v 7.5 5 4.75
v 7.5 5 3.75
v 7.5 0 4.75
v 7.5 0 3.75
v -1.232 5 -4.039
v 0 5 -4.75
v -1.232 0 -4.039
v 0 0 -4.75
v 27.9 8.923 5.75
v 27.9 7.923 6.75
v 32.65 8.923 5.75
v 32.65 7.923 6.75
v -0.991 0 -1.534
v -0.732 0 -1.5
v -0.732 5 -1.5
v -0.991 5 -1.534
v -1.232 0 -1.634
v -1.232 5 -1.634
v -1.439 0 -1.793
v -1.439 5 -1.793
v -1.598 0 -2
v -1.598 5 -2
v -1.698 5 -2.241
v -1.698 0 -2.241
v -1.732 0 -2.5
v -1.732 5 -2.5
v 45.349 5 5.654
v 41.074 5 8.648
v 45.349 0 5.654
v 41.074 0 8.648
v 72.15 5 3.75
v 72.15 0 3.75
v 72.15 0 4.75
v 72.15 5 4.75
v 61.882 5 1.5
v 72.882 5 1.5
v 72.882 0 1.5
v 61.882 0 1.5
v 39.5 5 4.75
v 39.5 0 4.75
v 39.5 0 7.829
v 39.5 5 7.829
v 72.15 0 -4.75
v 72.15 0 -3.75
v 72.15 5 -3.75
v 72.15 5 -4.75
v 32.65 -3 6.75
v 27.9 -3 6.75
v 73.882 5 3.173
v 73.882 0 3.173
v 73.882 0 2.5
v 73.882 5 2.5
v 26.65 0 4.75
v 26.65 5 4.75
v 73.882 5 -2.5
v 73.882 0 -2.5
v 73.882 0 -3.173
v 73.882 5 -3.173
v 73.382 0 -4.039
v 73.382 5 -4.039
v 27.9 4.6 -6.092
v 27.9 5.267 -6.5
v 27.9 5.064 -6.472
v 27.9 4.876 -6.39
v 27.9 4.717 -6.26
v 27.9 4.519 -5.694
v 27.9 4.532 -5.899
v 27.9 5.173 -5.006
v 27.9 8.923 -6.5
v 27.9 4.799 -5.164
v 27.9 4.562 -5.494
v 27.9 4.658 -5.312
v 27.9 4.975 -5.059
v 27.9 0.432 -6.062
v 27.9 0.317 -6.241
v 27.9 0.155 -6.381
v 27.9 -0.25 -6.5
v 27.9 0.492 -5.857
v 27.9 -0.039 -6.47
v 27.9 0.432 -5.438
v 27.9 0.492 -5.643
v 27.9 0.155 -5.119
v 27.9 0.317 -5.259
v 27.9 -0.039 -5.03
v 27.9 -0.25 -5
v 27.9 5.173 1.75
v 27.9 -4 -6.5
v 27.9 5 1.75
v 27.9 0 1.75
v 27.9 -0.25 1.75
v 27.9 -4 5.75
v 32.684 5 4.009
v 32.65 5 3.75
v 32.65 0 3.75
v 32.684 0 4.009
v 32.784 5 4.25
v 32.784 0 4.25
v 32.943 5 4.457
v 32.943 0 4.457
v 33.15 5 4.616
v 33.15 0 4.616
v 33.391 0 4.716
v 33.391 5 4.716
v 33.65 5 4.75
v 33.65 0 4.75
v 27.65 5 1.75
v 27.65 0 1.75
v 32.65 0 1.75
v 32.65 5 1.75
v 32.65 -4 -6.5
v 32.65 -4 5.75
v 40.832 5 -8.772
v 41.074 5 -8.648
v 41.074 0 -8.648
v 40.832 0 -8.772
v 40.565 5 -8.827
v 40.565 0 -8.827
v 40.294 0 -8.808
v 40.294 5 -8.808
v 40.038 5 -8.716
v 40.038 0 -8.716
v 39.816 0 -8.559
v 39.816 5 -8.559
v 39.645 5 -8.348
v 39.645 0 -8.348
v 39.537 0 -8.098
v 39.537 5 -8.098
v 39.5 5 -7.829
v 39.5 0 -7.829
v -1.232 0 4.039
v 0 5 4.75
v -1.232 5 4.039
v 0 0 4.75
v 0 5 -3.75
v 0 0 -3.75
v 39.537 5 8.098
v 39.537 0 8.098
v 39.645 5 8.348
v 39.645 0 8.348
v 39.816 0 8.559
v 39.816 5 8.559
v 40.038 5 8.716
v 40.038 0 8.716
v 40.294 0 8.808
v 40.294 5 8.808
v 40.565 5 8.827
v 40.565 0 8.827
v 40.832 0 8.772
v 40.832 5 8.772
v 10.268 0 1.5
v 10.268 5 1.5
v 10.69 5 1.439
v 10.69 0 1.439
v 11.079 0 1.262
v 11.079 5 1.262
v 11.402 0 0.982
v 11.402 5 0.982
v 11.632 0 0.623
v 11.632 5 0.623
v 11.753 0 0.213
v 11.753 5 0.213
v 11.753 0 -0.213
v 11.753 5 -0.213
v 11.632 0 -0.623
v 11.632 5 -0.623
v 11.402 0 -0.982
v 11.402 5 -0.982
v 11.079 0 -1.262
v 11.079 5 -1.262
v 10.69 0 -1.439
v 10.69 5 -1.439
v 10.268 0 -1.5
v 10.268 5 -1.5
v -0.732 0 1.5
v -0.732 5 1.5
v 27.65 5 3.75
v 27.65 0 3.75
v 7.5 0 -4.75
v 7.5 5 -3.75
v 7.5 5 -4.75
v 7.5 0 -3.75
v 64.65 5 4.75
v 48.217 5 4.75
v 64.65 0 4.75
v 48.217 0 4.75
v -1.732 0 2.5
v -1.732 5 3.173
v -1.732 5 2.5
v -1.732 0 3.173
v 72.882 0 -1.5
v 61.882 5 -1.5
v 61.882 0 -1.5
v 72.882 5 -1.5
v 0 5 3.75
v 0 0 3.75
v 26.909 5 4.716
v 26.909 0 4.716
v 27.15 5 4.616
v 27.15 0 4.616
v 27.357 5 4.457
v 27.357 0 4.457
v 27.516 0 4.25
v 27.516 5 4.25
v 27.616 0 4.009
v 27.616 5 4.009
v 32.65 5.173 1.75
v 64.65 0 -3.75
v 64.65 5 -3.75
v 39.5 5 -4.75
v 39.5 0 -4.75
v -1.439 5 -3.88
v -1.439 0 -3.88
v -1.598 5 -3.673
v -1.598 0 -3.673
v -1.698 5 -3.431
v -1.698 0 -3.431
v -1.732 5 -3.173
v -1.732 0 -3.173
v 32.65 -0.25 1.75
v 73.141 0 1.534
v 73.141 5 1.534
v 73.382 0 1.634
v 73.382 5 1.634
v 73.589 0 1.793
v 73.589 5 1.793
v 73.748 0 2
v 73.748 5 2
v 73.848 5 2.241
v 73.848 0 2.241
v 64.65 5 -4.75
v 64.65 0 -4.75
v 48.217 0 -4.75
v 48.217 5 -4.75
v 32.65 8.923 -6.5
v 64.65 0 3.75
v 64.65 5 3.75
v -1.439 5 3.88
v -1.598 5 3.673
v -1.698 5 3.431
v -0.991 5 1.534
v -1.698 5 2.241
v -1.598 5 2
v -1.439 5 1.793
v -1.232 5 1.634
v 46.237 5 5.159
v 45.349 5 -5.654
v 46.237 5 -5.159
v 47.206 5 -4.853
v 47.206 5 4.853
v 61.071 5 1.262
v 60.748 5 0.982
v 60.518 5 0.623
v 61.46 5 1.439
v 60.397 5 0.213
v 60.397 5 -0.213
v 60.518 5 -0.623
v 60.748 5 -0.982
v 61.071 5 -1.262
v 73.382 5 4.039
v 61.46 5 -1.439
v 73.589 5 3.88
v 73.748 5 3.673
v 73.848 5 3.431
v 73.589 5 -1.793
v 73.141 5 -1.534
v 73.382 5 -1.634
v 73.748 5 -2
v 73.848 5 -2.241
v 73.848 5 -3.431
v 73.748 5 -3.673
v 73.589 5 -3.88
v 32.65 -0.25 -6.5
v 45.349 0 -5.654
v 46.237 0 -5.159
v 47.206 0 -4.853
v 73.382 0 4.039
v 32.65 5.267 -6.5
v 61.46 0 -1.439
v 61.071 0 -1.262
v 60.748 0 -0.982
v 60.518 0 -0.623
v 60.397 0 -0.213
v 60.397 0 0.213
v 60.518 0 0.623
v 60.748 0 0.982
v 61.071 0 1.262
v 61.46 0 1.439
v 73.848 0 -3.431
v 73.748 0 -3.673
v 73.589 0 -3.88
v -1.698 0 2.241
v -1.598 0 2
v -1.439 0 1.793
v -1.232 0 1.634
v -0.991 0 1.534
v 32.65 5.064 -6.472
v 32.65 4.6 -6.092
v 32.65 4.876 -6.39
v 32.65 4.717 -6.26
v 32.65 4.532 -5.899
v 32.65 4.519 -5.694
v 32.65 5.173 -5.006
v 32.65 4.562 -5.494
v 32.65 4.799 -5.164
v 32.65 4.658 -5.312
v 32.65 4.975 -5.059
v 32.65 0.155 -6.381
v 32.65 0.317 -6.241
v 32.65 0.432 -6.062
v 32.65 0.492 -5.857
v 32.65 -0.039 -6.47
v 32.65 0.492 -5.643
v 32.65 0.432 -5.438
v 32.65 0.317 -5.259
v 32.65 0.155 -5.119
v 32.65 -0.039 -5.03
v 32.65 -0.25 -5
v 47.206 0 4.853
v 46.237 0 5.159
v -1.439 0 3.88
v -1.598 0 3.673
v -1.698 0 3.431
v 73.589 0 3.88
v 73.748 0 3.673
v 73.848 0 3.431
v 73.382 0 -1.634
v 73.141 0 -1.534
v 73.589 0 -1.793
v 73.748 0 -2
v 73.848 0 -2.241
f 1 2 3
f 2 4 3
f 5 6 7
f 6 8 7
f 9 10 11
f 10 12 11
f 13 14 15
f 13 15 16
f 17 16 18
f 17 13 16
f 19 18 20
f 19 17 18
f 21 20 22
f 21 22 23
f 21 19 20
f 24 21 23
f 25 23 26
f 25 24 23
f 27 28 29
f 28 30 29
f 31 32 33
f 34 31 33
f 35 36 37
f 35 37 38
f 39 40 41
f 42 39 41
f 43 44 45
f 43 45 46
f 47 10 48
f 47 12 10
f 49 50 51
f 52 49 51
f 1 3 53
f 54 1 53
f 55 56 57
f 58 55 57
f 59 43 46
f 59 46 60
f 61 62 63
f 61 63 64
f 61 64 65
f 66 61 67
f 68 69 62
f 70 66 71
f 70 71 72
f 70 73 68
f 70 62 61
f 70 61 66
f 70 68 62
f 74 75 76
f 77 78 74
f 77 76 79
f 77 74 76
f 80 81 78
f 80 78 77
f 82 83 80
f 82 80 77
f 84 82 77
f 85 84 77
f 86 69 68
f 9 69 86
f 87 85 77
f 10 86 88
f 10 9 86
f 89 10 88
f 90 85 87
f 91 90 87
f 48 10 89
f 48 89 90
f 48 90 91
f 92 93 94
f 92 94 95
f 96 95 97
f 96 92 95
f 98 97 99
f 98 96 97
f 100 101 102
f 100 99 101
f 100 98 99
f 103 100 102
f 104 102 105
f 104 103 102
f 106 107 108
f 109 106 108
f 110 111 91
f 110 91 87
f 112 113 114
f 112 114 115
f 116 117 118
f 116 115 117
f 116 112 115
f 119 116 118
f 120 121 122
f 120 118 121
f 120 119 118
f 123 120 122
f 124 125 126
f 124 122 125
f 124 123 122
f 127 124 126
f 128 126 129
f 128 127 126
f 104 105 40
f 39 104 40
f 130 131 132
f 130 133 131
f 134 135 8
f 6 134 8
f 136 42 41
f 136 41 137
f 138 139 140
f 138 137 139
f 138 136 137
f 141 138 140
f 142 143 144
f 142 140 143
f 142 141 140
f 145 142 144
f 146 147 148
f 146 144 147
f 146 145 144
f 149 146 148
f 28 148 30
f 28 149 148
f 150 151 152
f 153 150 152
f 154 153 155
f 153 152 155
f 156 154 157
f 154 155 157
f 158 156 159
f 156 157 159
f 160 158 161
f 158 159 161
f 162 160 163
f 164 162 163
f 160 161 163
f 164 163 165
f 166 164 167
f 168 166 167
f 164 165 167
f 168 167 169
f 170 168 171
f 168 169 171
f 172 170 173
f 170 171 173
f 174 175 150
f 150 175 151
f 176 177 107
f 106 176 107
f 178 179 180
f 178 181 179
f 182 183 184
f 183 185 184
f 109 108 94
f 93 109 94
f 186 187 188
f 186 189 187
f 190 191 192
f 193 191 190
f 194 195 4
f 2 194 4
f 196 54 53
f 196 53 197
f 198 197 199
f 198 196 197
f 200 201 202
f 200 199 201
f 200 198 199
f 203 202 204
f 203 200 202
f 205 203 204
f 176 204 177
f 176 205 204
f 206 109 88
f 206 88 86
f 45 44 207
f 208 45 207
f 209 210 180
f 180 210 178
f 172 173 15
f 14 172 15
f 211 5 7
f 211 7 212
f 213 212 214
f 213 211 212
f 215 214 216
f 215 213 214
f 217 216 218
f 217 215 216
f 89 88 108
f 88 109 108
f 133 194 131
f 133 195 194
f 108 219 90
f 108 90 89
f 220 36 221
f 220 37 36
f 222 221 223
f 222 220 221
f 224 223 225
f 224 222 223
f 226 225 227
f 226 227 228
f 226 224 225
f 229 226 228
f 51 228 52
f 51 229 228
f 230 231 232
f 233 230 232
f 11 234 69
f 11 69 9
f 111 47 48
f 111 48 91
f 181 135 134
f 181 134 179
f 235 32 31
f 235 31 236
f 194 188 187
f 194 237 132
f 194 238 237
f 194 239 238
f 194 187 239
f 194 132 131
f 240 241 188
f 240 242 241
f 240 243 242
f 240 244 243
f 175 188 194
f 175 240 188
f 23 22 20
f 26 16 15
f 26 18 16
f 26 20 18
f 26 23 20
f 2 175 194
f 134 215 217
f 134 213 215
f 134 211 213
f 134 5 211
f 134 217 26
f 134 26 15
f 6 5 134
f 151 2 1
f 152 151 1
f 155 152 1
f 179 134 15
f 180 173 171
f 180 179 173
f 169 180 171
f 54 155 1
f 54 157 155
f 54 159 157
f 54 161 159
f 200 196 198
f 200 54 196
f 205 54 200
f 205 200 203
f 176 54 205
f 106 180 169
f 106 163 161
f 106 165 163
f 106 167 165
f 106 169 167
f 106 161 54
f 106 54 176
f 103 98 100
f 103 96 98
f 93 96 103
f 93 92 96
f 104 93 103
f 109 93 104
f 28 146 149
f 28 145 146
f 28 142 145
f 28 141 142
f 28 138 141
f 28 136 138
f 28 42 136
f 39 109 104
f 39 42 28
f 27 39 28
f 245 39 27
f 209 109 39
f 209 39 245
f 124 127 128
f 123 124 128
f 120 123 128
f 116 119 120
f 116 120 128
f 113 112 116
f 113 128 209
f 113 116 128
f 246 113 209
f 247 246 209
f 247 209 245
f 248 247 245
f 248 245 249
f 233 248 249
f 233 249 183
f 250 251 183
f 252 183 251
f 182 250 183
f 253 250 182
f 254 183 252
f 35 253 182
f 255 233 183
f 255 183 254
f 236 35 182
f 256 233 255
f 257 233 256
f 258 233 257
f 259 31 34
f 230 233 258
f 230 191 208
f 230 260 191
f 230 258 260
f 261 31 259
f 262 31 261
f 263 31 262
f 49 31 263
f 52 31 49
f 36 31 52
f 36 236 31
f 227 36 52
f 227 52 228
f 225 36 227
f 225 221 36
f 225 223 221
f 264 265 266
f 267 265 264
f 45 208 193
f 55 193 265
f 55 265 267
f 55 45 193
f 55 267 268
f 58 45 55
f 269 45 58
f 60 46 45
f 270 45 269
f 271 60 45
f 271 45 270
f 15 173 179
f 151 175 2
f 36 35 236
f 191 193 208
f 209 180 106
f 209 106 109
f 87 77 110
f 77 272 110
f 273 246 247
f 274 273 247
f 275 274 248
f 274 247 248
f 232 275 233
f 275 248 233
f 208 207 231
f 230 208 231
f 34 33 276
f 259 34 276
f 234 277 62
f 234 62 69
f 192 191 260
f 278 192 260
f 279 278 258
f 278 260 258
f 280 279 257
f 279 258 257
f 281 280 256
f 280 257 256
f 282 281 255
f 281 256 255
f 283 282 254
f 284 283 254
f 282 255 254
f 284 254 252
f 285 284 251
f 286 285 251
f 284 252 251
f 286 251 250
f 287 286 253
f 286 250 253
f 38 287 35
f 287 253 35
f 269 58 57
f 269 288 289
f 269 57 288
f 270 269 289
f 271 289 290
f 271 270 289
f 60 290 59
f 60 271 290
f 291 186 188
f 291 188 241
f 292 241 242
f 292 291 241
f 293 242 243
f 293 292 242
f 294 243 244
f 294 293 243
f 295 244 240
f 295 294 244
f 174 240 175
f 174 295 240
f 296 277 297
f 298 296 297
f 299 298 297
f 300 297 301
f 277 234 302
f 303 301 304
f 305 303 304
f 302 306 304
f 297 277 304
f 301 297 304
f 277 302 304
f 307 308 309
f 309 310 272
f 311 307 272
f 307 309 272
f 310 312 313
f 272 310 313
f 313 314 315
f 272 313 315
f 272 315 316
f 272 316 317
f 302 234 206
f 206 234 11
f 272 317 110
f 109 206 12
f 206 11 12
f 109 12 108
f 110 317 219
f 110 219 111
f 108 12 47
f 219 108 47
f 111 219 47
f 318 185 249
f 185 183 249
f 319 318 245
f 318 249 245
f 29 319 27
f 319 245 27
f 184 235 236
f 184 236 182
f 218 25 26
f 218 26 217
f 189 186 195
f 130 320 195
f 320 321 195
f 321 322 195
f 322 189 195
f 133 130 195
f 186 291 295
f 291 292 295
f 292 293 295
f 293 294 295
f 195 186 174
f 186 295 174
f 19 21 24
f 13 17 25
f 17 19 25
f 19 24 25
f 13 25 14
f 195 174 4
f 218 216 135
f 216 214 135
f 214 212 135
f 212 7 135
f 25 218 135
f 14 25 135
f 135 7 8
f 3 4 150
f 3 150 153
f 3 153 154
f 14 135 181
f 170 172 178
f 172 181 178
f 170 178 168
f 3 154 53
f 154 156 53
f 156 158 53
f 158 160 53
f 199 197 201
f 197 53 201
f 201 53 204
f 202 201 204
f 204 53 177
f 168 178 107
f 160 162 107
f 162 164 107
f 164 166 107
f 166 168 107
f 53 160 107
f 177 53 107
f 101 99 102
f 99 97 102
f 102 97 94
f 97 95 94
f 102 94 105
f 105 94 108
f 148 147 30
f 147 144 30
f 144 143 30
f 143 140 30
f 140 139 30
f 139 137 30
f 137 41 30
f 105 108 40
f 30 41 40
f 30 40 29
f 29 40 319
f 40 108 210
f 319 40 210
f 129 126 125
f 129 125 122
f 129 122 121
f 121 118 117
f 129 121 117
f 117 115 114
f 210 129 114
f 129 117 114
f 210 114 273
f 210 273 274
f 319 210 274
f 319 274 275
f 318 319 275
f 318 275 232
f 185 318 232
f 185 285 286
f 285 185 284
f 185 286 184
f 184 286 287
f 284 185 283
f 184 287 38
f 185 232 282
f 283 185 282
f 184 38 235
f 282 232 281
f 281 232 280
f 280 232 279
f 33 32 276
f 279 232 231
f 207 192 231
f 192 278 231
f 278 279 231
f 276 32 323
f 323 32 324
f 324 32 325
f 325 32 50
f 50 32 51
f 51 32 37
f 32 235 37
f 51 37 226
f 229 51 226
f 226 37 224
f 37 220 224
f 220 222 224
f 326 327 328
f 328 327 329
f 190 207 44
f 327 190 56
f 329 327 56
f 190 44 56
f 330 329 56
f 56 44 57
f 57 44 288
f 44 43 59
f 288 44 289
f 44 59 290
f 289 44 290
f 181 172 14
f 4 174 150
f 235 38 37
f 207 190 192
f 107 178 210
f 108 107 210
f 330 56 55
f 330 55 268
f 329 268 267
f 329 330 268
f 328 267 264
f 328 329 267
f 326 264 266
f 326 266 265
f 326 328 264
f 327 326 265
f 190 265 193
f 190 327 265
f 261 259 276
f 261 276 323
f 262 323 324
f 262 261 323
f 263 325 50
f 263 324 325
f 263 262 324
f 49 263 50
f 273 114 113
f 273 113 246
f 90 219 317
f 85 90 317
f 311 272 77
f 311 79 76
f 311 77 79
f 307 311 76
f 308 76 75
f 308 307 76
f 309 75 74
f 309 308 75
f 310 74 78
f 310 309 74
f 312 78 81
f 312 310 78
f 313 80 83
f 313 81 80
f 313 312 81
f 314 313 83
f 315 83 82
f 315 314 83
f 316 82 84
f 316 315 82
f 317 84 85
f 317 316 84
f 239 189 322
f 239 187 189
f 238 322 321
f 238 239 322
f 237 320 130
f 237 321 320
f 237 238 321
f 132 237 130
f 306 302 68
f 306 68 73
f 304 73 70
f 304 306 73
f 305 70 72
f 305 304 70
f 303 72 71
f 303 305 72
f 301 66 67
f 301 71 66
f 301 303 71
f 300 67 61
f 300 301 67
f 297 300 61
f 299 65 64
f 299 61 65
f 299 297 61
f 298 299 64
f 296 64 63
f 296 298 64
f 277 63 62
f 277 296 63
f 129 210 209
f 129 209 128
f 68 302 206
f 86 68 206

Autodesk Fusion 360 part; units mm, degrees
sketch "Sketch1" plane through (0, 0, 0) normal (0, 1, 0) x (1, 0, 0)
  line L0 (0, 0) -> (0, -3.75) construction
  line L1 (0, -3.75) -> (7.5, -3.75)
  line L2 (0, -3.75) -> (0, -4.75)
  line L3 (0, -4.75) -> (-1.7321, -3.75)
  line L4 (0, -4.75) -> (1.5486, -4.75) construction
  line L5 (-1.7321, -3.75) -> (-1.7321, 0)
  line L6 (7.5, -3.75) -> (7.5, -4.75)
  line L7 (7.5, -4.75) -> (64.65, -4.75)
  line L8 (-1.7321, 0) -> (36.075, 0) construction
  line L9 (36.075, 0) -> (36.075, -4.75) construction
  line L10 (73.8821, -3.75) -> (73.8821, 0)
  line L11 (72.15, -4.75) -> (73.8821, -3.75)
  line L12 (72.15, -3.75) -> (64.65, -3.75)
  line L13 (72.15, -3.75) -> (72.15, -4.75)
  line L14 (64.65, -3.75) -> (64.65, -4.75)
  line L15 (64.65, -4.75) -> (7.5, -4.75)
  line L16 (73.8821, 3.75) -> (73.8821, 0)
  line L17 (72.15, 4.75) -> (73.8821, 3.75)
  line L18 (72.15, 3.75) -> (64.65, 3.75)
  line L19 (72.15, 3.75) -> (72.15, 4.75)
  line L20 (64.65, 3.75) -> (64.65, 4.75)
  line L21 (64.65, 4.75) -> (7.5, 4.75)
  line L22 (7.5, 3.75) -> (7.5, 4.75)
  line L23 (0, 3.75) -> (7.5, 3.75)
  line L24 (0, 3.75) -> (0, 4.75)
  line L25 (0, 4.75) -> (-1.7321, 3.75)
  line L26 (-1.7321, 3.75) -> (-1.7321, 0)
  line L27 (-1.7321, 0) -> (73.8821, 0)
  point P0 (36.075, -4.75)
  dimension "d1" = 3.75
  dimension "d2" = 7.5
  dimension "d4" = 150
  dimension "d5" = 57.15
  dimension "d8" = 4.75
extrude "Extrude1" add sketch "Sketch1" along normal blind 5 makes body 1
sketch "Sketch2" plane through (0, 5, 0) normal (0, 1, 0) x (-1, 0, 0)
  line L0 (0, -3.75) -> (0, -4.75)
  line L1 (0, -4.75) -> (1.7321, -3.75)
  line L2 (1.7321, -3.75) -> (1.7321, 3.75)
  line L3 (1.7321, 3.75) -> (0, 4.75)
  line L4 (0, 4.75) -> (0, 3.75)
  line L5 (0, 3.75) -> (-7.5, 3.75)
  line L6 (-7.5, 3.75) -> (-7.5, 4.75)
  line L7 (-7.5, 4.75) -> (-64.65, 4.75)
  line L8 (-64.65, 4.75) -> (-64.65, 3.75)
  line L9 (-64.65, 3.75) -> (-72.15, 3.75)
  line L10 (-72.15, 3.75) -> (-72.15, 4.75)
  line L11 (-72.15, 4.75) -> (-73.8821, 3.75)
  line L12 (-73.8821, 3.75) -> (-73.8821, -3.75)
  line L13 (-73.8821, -3.75) -> (-72.15, -4.75)
  line L14 (-72.15, -4.75) -> (-72.15, -3.75)
  line L15 (-72.15, -3.75) -> (-64.65, -3.75)
  line L16 (-64.65, -3.75) -> (-64.65, -4.75)
  line L17 (-64.65, -4.75) -> (-7.5, -4.75)
  line L18 (-7.5, -4.75) -> (-7.5, -3.75)
  line L19 (-7.5, -3.75) -> (0, -3.75)
  line L20 (-73.8821, 0) -> (1.7321, 0) construction
  line L21 (-36.075, 4.75) -> (-36.075, -4.75) construction
  line L22 (1.7321, 1.5) -> (-10.2679, 1.5)
  arc A0 (-10.2679, 1.5) -> (-10.2679, -1.5) centre (-10.2679, 0) ccw
  line L23 (-10.2679, -1.5) -> (1.7321, -1.5)
  arc A1 (1.7321, -1.5) -> (1.7321, 1.5) centre (1.7321, 0) ccw
  line L24 (1.7321, 0) -> (-10.2679, 0) construction
  line L25 (-61.8821, -1.5) -> (-73.8821, -1.5)
  arc A2 (-61.8821, -1.5) -> (-61.8821, 1.5) centre (-61.8821, 0) ccw
  line L26 (-73.8821, 1.5) -> (-61.8821, 1.5)
  arc A3 (-73.8821, 1.5) -> (-73.8821, -1.5) centre (-73.8821, 0) ccw
  dimension "d9" = 1.5
  dimension "d10" = 12
extrude "Extrude2" cut sketch "Sketch2" against normal through all contours L2 L22 A0 L23 | L12 L25 A2 L26 bodies 1
sketch "Sketch3" plane through (0, 0, 0) normal (0, -1, 0) x (1, 0, 0)
  line L0 (61.8821, 1.5) -> (73.8821, 1.5)
  line L1 (73.8821, 1.5) -> (73.8821, 3.75)
  line L2 (73.8821, 3.75) -> (72.15, 4.75)
  line L3 (72.15, 4.75) -> (72.15, 3.75)
  line L4 (72.15, 3.75) -> (64.65, 3.75)
  line L5 (64.65, 3.75) -> (64.65, 4.75)
  line L6 (64.65, 4.75) -> (7.5, 4.75)
  line L7 (7.5, 4.75) -> (7.5, 3.75)
  line L8 (7.5, 3.75) -> (0, 3.75)
  line L9 (0, 3.75) -> (0, 4.75)
  line L10 (0, 4.75) -> (-1.7321, 3.75)
  line L11 (-1.7321, 3.75) -> (-1.7321, 1.5)
  line L12 (-1.7321, 1.5) -> (10.2679, 1.5)
  arc A0 (10.2679, -1.5) -> (10.2679, 1.5) centre (10.2679, 0) ccw
  line L13 (10.2679, -1.5) -> (-1.7321, -1.5)
  line L14 (-1.7321, -1.5) -> (-1.7321, -3.75)
  line L15 (-1.7321, -3.75) -> (0, -4.75)
  line L16 (0, -4.75) -> (0, -3.75)
  line L17 (0, -3.75) -> (7.5, -3.75)
  line L18 (7.5, -3.75) -> (7.5, -4.75)
  line L19 (7.5, -4.75) -> (64.65, -4.75)
  line L20 (64.65, -4.75) -> (64.65, -3.75)
  line L21 (64.65, -3.75) -> (72.15, -3.75)
  line L22 (72.15, -3.75) -> (72.15, -4.75)
  line L23 (72.15, -4.75) -> (73.8821, -3.75)
  line L24 (73.8821, -3.75) -> (73.8821, -1.5)
  line L25 (73.8821, -1.5) -> (61.8821, -1.5)
  arc A1 (61.8821, 1.5) -> (61.8821, -1.5) centre (61.8821, 0) ccw
  line L26 (36.075, 4.75) -> (36.075, -4.75) construction
  line L27 (32.65, 4.75) -> (32.65, -4.75) construction
  line L28 (39.5, 4.75) -> (39.5, -4.75) construction
  line L29 (39.5, 4.75) -> (39.5, 9.75)
  line L30 (39.5, 9.75) -> (46.6407, 4.75)
  line L31 (32.65, 0) -> (39.5, 0) construction
  line L32 (39.5, -4.75) -> (39.5, -9.75)
  line L33 (39.5, -9.75) -> (46.6407, -4.75)
  line L34 (32.65, 4.75) -> (27.65, 4.75)
  line L35 (27.65, 4.75) -> (27.65, 1.75)
  line L36 (27.65, 1.75) -> (32.65, 1.75)
  line L37 (32.65, 1.75) -> (32.65, 4.75)
  line L38 (32.65, 1.75) -> (32.65, -2.25)
  line L39 (32.65, -2.25) -> (27.65, -2.25) construction
  line L40 (27.65, -2.25) -> (27.65, -1.15)
  line L41 (27.65, -1.15) -> (32.65, -1.15)
  line L42 (27.65, -2.25) -> (27.65, -3.35)
  line L43 (27.65, -3.35) -> (32.65, -3.35)
  line L44 (32.65, -2.25) -> (32.65, -3.35)
  dimension "d13" = 6.85
  dimension "d14" = 35
  dimension "d15" = 5
  dimension "d16" = 5
  dimension "d17" = 3
  dimension "d44" = 1.1
  dimension "d45" = 1.1
  dimension "d46" = 4
extrude "Extrude3" add sketch "Sketch3" against normal blind 5 contours L6 L29 L30 | L19 L32 L33 bodies 1
extrude "Extrude4" cut sketch "Sketch3" against normal blind 5 contours L6 L34 L35 L36 L37 bodies 1
fillet "Fillet1" radius 1 2 edges at (39.5, 2.5, 9.75) (39.5, 2.5, -9.75) on bodies 1
fillet "Fillet1" radius 5 2 edges at (46.6407, 2.5, 4.75) (46.6407, 2.5, -4.75) on bodies 1
fillet "Fillet1" radius 1 8 edges at (73.8821, 2.5, 3.75) (73.8821, 2.5, 1.5) (73.8821, 2.5, -1.5) (73.8821, 2.5, -3.75) (-1.7321, 2.5, 3.75) (-1.7321, 2.5, 1.5) (-1.7321, 2.5, -1.5) (-1.7321, 2.5, -3.75) on bodies 1
fillet "Fillet1" radius 1 2 edges at (32.65, 2.5, 4.75) (27.65, 2.5, 4.75) on bodies 1
sketch "Sketch1 (2)" plane through (32.65, 0, 0) normal (-1, 0, 0) x (0, -1, 0) in component "Collar"
  line L0 (-5, 3.75) -> (-5, 1.75)
  line L1 (-5, 1.75) -> (0, 1.75)
  line L2 (0, 1.75) -> (0, 3.75)
  line L3 (0, 1.75) -> (-5, 1.75)
  line L4 (-5, 1.75) -> (0, 1.75)
  line L5 (0.25, 1.75) -> (-5.1734, 1.75)
  line L6 (-7.9234, 6.75) -> (3, 6.75)
  line L7 (4, 5.75) -> (4, -6.5)
  line L8 (-8.9234, -6.5) -> (-8.9234, 5.75)
  line L9 (0.25, -6.5) -> (4, -6.5)
  line L10 (-5.2669, -6.5) -> (-8.9234, -6.5)
  line L11 (3, 6.75) -> (4, 5.75)
  line L12 (-7.9234, 6.75) -> (-8.9234, 5.75)
  arc A0 (0.25, -5) -> (0.25, -6.5) centre (0.25, -5.75) ccw
  line L13 (0.25, 1.75) -> (0.25, -5)
  arc A1 (-5.2669, -6.5) -> (-5.1734, -5.0058) centre (-5.2669, -5.75) ccw
  line L14 (-5.1734, -5.0058) -> (-5.1734, 1.75)
  point P0 (-8.9234, 6.75)
  point P1 (4, 6.75)
  dimension "d38" = 1
  dimension "d39" = 1
  dimension "d40" = 1
  dimension "d41" = 1
  dimension "d42" = 1.5
  dimension "d43" = 1.5
  dimension "d50" = 7.5
  dimension "d52" = 3.75
  dimension "d54" = 5
  dimension "d55" = 3.75
extrude "Extrude1'" add sketch "Sketch1 (2)" along normal blind 4.75 separate body makes body 2 in component "Collar"
copy_body "Body->Comp1" bodies 1 removing the originals makes body 3 in component "Snap Axis"
component "Collar" placed x (1, 0, 0) y (0, 1, 0) z (0, 0, 1) at (0, 0, 0)
component "Snap Axis" placed x (1, 0, 0) y (0, 1, 0) z (0, 0, 1) at (0, 0, 0)
equation "d13 = 6.35 mm + 0.5 mm"
equation "d39 = d38"
equation "d41 = d40"
